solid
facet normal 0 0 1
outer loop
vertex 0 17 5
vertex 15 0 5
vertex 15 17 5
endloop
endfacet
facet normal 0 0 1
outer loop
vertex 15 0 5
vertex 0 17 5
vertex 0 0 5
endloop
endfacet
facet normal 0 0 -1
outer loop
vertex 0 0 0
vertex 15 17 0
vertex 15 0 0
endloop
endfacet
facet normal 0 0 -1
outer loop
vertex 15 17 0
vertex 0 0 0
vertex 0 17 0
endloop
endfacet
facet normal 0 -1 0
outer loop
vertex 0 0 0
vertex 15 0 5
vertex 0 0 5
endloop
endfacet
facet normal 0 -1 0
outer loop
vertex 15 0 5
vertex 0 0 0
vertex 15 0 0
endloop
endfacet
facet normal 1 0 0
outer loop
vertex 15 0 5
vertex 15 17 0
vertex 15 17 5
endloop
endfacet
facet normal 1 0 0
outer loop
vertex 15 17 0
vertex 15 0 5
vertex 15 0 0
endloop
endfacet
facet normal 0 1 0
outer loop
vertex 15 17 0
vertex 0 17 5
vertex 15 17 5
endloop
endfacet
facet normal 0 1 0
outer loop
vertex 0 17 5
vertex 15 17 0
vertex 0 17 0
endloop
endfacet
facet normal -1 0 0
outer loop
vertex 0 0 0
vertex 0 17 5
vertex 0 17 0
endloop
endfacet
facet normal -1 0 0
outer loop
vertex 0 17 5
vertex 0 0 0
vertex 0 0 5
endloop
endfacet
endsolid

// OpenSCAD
// Generated by SolidPython 1.0.1 on 2020-07-29 00:46:55


cube(size = [15, 17, 5]);
/***********************************************
*********      SolidPython code:      **********
************************************************
 
# import packages: SolidPython
from solid import *
from solid.utils import *
from itertools import chain, combinations, permutations


class Resize:

    def __init__(self, scad_file):
        self.scad_file = scad_file
        #self.scad_file = import_scad(scad_file)
        # cone/cylinder param:
        self.r1 = 0
        self.r2 = 0
        self.h = 0
        # rectangular prism param:
        self.w = 0
        self.l = 0
        # ellipse param:
        self.r = 0

    # import OpenScad code (file name corresponds to shape)


    # classify shape + parameters
    def assign(self, param1, param2, param3):
        if self.scad_file == 'cone.scad':
            self.r1 = param1
            self.r2 = param2
            self.h = param3
        elif self.scad_file == 'cylinder.scad':
            self.r1 = param1
            self.r2 = param2
            self.h = param3
        elif self.scad_file == 'rectangularPrism.scad':
            self.h = param1
            self.l = param2
            self.w = param3
        else:
            self.r = param1
            self.h = param2

    # resize parameters
    def iterate(self):
        x = range(3, 20, 2)
        i = 1
        if self.scad_file == 'cone.scad':
            tempList = list(permutations(x, 2))
            for temp in tempList:
                param1 = temp[0]
                param2 = temp[1]
                filepath = 'produced_scad_files/' + 'cone' + str(param1) + '_' + str(param2) + '_' + '.scad'
                scad_render_to_file(cylinder(h=param1, r1=param2, r2=0), filepath)

        elif self.scad_file == 'cylinder.scad':
            tempList = list(permutations(x, 3))
            for temp in tempList:
                param1 = temp[0]
                param2 = temp[1]
                filepath = 'produced_scad_files/' + 'cylinder' + str(param1) + '_' + str(param2) + '_' + '.scad'
                scad_render_to_file(cylinder(h=param1, r1=param2, r2=param2), filepath)

        elif self.scad_file == 'rectangularPrism.scad':
            tempList = list(permutations(x, 3))
            for temp in tempList:
                param1 = temp[0]
                param2 = temp[1]
                param3 = temp[2]
                filepath = 'produced_scad_files/' + 'rectangularPrism' + str(param1) + '_' + str(param2) + '_' + str(
                    param3) + '.scad'
                scad_render_to_file(cube(size=(param1, param2, param3)), filepath)

        elif self.scad_file == 'ellipse.scad':
            tempList = list(permutations(x, 4))
            for temp in tempList:
                param1 = temp[0]
                param2 = temp[1]
                param3 = temp[2]
                param4 = temp[3]
                filepath = 'produced_scad_files/' + 'ellipse' + str(param1) + '_' + str(param2) + '_' + str(param3) + '_' + str(param4) + '.scad'
                scad_render_to_file(scale([param1, param2, param3])(sphere(r=param4)), filepath)

    def render_to_scadfile(self):
        scad_render_to_file(scad, 'example.scad') 
 
************************************************/
